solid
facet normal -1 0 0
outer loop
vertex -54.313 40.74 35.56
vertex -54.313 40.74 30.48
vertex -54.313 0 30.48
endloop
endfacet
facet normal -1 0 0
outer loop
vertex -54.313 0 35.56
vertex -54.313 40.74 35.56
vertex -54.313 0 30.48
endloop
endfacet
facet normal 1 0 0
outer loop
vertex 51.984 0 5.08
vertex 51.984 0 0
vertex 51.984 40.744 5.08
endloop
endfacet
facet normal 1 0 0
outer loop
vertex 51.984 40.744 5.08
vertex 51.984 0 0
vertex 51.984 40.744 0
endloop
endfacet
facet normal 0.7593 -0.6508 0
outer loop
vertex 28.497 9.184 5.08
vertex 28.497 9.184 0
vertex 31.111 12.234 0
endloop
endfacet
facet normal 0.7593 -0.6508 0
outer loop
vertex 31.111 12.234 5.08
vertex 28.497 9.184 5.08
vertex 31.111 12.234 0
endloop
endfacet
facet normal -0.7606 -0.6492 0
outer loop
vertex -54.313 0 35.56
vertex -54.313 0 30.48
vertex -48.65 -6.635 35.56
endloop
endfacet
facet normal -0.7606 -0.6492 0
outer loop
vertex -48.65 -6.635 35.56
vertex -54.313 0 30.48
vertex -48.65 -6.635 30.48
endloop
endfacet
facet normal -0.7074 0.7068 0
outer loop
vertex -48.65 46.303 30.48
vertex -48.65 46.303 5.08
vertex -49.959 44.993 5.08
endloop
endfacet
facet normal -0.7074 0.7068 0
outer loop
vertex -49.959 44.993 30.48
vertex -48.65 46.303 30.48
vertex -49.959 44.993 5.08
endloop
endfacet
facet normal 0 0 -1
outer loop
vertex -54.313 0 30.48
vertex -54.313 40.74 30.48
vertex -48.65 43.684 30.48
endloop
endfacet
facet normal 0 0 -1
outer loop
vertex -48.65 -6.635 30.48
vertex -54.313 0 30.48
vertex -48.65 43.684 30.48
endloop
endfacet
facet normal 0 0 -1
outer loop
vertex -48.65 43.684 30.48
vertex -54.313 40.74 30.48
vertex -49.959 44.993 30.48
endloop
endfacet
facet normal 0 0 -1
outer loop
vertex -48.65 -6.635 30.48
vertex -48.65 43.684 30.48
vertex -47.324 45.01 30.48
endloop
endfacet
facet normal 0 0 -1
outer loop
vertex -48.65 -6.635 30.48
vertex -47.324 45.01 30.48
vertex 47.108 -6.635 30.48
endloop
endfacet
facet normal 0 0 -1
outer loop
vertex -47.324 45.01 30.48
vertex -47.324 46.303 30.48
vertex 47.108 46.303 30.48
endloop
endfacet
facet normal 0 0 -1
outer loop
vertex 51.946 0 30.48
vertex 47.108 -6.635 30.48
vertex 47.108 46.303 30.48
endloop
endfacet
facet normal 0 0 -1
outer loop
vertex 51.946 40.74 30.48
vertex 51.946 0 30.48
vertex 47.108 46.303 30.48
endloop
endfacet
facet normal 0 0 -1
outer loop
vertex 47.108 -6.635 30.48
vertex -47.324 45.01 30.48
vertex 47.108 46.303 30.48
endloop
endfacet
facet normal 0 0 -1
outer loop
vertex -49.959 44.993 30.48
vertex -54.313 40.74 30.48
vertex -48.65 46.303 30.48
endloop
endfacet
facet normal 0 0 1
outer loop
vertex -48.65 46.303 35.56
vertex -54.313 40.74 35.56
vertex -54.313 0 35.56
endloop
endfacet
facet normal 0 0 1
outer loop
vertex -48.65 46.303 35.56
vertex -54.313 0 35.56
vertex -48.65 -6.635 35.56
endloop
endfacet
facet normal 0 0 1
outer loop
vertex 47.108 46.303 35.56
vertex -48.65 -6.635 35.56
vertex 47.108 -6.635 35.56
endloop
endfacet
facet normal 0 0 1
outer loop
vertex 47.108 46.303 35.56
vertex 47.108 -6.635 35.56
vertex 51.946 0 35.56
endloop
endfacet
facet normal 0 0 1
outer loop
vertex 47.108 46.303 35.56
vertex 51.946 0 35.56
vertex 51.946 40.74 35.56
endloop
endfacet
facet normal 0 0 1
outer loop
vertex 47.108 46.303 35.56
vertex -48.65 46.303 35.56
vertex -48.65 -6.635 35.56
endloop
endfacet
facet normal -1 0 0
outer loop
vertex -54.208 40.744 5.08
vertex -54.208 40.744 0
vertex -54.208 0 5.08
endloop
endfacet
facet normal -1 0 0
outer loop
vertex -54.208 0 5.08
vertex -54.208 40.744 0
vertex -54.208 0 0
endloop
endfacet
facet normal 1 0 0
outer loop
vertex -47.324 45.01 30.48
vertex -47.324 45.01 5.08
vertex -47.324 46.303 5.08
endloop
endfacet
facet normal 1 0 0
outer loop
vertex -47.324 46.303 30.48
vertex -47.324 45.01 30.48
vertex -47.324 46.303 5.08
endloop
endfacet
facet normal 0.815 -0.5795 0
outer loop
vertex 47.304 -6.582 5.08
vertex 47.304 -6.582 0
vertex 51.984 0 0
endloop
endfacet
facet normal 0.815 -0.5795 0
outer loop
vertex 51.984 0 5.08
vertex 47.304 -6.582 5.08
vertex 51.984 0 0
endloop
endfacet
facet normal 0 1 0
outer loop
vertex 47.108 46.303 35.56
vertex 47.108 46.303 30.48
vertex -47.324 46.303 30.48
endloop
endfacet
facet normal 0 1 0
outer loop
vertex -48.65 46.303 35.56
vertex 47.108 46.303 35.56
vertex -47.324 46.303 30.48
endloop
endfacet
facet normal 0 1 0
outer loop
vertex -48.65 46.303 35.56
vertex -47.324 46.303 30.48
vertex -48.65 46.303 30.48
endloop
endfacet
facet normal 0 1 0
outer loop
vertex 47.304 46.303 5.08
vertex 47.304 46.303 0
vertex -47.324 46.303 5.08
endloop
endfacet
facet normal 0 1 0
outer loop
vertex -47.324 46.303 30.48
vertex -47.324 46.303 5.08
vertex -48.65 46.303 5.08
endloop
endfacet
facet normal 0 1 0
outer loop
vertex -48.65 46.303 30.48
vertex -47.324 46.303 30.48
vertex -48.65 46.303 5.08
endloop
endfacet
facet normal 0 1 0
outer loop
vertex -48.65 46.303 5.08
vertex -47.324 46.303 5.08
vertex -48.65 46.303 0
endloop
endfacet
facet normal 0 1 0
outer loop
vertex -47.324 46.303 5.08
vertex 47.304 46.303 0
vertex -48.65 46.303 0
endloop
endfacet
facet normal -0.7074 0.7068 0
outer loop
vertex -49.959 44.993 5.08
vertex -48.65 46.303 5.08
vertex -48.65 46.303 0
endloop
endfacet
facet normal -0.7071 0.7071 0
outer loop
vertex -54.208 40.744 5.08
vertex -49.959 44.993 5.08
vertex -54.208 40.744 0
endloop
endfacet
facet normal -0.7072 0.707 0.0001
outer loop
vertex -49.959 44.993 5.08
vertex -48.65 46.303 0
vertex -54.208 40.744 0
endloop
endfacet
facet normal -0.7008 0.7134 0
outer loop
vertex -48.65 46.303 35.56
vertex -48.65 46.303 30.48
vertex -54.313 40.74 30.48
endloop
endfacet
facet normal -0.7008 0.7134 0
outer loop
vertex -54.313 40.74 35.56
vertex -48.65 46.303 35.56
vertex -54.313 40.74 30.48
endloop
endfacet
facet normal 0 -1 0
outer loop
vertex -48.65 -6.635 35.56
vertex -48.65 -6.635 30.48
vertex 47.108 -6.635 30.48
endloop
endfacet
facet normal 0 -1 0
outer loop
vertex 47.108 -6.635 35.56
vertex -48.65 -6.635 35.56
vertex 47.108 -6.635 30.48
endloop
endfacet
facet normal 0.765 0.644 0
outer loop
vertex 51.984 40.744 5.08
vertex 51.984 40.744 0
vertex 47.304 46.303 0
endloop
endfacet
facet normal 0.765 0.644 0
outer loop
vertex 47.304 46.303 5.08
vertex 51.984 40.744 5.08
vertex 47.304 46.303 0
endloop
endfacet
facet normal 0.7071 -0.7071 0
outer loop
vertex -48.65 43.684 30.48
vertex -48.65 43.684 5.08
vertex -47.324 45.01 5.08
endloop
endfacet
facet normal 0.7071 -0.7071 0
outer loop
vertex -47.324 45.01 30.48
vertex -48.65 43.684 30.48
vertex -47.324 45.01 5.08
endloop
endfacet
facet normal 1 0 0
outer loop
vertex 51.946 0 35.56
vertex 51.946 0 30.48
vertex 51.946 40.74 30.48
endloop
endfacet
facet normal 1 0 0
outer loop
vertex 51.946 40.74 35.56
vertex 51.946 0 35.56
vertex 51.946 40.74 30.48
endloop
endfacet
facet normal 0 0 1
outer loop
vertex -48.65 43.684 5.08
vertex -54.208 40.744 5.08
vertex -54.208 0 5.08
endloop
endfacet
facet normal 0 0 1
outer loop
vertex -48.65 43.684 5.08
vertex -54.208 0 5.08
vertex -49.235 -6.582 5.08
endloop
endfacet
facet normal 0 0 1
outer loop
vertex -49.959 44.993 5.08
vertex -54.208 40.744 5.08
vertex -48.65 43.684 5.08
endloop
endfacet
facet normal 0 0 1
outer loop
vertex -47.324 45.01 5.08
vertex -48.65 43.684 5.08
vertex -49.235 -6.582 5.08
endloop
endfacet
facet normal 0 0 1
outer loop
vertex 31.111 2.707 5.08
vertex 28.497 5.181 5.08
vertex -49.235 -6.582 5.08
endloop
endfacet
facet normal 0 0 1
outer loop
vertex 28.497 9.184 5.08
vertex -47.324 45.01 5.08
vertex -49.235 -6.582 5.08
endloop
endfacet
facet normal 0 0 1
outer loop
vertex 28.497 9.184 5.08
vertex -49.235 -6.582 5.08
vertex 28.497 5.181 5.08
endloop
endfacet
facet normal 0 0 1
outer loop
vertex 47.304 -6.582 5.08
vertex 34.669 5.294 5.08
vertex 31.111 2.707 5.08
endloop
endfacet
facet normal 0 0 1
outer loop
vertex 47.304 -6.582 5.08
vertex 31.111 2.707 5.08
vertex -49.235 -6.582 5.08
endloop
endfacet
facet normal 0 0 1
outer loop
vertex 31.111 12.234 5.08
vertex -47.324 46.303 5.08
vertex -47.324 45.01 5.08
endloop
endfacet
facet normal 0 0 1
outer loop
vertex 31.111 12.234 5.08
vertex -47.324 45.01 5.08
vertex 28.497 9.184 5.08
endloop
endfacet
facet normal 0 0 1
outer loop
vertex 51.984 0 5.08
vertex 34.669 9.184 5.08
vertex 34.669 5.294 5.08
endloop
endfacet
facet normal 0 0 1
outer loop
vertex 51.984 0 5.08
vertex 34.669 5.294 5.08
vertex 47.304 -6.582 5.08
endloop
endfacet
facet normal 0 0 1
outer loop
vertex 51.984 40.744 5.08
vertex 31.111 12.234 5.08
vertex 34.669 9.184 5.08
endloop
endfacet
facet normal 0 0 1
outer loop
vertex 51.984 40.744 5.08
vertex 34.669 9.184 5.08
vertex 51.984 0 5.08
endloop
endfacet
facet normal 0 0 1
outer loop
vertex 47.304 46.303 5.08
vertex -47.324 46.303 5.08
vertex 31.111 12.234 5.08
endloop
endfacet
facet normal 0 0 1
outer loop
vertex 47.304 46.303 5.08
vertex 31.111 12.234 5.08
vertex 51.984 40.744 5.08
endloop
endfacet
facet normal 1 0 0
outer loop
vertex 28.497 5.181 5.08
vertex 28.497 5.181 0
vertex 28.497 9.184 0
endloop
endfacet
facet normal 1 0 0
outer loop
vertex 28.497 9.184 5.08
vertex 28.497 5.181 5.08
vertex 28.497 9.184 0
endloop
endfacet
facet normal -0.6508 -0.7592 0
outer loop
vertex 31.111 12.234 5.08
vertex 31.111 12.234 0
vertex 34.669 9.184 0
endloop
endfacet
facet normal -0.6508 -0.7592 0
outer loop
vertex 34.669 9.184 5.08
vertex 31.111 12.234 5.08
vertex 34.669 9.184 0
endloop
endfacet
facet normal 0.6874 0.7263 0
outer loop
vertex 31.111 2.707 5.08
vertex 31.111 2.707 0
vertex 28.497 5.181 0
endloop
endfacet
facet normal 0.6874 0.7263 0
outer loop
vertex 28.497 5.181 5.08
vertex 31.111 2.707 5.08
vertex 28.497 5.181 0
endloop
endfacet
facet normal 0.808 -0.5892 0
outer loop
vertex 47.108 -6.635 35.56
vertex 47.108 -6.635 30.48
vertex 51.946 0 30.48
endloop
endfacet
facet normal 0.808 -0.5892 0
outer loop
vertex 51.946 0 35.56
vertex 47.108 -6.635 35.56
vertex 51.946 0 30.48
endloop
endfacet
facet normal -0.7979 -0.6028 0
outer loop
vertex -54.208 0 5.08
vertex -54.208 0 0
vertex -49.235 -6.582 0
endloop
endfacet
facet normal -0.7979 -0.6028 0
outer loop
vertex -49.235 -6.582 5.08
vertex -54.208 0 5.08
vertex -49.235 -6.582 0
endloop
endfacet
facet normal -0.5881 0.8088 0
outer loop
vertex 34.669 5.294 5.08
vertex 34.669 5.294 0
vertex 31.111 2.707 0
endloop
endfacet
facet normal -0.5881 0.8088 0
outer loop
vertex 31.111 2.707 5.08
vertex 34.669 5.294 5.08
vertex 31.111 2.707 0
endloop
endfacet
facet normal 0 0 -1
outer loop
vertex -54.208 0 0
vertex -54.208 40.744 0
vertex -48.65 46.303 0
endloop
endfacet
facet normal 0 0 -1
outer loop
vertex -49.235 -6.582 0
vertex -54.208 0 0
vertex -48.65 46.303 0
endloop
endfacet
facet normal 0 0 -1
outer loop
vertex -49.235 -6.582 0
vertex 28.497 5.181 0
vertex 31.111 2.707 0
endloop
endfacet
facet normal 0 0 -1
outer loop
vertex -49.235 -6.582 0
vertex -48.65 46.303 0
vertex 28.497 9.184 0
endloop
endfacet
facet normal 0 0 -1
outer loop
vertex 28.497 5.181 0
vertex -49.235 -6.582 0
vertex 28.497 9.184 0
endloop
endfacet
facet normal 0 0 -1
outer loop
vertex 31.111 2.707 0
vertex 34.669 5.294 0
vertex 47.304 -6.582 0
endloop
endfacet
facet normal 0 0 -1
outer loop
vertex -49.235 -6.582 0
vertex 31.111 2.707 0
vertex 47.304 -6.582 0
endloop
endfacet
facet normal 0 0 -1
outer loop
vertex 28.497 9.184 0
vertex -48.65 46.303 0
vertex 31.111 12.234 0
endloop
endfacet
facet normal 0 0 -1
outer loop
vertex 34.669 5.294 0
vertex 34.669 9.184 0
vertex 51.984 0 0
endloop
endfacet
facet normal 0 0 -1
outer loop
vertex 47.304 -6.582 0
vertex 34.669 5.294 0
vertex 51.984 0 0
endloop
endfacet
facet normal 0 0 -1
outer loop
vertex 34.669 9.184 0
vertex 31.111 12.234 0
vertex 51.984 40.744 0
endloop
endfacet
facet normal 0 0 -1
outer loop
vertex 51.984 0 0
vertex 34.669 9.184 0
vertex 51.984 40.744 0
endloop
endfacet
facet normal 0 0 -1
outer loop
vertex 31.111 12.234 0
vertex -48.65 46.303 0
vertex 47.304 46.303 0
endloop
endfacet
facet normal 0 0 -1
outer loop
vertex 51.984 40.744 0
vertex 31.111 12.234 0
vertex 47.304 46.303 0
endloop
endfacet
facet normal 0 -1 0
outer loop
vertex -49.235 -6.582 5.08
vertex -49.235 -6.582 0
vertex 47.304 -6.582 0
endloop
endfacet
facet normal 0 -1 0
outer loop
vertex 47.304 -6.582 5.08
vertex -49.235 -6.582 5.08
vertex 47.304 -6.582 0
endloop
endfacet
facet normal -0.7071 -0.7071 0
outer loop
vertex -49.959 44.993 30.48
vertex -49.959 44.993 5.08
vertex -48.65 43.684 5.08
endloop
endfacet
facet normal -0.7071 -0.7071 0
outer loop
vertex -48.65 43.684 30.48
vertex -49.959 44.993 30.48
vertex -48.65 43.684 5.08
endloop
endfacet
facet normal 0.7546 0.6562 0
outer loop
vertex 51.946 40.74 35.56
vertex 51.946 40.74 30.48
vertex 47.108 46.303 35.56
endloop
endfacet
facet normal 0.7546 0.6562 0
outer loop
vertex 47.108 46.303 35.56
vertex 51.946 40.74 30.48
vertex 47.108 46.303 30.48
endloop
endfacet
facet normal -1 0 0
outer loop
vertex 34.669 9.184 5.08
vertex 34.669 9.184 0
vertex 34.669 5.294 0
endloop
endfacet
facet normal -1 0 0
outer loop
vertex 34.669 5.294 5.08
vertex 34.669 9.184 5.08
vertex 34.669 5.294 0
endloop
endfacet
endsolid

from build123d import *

# Parameters (mm, degrees)
F1_DEPTH = 5.08
F3_DEPTH = 25.4
F5_DEPTH = 5.08
F7_DEPTH = 5.08


with BuildPart() as f1:
    # F0 (on Top) → F1 (new body)
    with BuildSketch(Plane.XY):
        Polygon((47.303539, 46.30276), (-48.649952, 46.30276), (-54.208234, 40.744482), (-54.208234, 0), (-49.235035, -6.582176), (47.303539, -6.582176), (51.984198, 0), (51.984198, 40.744482), align=None)
    extrude(amount=F1_DEPTH)

    # F2 (on face) → F3 (join)
    with BuildSketch(Plane.XY.offset(5.08)):
        Polygon((-48.649952, 46.30276), (-49.959227, 44.993486), (-48.649952, 43.68421), (-47.324431, 45.00973), (-47.324431, 46.30276), align=None)
    extrude(amount=F3_DEPTH)

    # F4 (on face) → F5 (join)
    with BuildSketch(Plane.XY.offset(30.48)):
        Polygon((47.10824, 46.30276), (-48.649952, 46.30276), (-54.313436, 40.739778), (-54.313436, 0), (-48.649952, -6.634823), (47.10824, -6.634823), (51.945787, 0), (51.945787, 40.739778), align=None)
    extrude(amount=F5_DEPTH)

    # F6 (on face) → F7 (cut)
    with BuildSketch(Plane(origin=(0, 0, 0), x_dir=(1, 0, 0), z_dir=(0, 0, -1))):
        Polygon((34.669146, -9.18433), (34.669146, -5.294323), (31.111144, -2.706686), (28.497104, -5.180843), (28.497104, -9.18433), (31.111144, -12.234045), align=None)
    extrude(amount=-F7_DEPTH, mode=Mode.SUBTRACT)


solid = f1.part
